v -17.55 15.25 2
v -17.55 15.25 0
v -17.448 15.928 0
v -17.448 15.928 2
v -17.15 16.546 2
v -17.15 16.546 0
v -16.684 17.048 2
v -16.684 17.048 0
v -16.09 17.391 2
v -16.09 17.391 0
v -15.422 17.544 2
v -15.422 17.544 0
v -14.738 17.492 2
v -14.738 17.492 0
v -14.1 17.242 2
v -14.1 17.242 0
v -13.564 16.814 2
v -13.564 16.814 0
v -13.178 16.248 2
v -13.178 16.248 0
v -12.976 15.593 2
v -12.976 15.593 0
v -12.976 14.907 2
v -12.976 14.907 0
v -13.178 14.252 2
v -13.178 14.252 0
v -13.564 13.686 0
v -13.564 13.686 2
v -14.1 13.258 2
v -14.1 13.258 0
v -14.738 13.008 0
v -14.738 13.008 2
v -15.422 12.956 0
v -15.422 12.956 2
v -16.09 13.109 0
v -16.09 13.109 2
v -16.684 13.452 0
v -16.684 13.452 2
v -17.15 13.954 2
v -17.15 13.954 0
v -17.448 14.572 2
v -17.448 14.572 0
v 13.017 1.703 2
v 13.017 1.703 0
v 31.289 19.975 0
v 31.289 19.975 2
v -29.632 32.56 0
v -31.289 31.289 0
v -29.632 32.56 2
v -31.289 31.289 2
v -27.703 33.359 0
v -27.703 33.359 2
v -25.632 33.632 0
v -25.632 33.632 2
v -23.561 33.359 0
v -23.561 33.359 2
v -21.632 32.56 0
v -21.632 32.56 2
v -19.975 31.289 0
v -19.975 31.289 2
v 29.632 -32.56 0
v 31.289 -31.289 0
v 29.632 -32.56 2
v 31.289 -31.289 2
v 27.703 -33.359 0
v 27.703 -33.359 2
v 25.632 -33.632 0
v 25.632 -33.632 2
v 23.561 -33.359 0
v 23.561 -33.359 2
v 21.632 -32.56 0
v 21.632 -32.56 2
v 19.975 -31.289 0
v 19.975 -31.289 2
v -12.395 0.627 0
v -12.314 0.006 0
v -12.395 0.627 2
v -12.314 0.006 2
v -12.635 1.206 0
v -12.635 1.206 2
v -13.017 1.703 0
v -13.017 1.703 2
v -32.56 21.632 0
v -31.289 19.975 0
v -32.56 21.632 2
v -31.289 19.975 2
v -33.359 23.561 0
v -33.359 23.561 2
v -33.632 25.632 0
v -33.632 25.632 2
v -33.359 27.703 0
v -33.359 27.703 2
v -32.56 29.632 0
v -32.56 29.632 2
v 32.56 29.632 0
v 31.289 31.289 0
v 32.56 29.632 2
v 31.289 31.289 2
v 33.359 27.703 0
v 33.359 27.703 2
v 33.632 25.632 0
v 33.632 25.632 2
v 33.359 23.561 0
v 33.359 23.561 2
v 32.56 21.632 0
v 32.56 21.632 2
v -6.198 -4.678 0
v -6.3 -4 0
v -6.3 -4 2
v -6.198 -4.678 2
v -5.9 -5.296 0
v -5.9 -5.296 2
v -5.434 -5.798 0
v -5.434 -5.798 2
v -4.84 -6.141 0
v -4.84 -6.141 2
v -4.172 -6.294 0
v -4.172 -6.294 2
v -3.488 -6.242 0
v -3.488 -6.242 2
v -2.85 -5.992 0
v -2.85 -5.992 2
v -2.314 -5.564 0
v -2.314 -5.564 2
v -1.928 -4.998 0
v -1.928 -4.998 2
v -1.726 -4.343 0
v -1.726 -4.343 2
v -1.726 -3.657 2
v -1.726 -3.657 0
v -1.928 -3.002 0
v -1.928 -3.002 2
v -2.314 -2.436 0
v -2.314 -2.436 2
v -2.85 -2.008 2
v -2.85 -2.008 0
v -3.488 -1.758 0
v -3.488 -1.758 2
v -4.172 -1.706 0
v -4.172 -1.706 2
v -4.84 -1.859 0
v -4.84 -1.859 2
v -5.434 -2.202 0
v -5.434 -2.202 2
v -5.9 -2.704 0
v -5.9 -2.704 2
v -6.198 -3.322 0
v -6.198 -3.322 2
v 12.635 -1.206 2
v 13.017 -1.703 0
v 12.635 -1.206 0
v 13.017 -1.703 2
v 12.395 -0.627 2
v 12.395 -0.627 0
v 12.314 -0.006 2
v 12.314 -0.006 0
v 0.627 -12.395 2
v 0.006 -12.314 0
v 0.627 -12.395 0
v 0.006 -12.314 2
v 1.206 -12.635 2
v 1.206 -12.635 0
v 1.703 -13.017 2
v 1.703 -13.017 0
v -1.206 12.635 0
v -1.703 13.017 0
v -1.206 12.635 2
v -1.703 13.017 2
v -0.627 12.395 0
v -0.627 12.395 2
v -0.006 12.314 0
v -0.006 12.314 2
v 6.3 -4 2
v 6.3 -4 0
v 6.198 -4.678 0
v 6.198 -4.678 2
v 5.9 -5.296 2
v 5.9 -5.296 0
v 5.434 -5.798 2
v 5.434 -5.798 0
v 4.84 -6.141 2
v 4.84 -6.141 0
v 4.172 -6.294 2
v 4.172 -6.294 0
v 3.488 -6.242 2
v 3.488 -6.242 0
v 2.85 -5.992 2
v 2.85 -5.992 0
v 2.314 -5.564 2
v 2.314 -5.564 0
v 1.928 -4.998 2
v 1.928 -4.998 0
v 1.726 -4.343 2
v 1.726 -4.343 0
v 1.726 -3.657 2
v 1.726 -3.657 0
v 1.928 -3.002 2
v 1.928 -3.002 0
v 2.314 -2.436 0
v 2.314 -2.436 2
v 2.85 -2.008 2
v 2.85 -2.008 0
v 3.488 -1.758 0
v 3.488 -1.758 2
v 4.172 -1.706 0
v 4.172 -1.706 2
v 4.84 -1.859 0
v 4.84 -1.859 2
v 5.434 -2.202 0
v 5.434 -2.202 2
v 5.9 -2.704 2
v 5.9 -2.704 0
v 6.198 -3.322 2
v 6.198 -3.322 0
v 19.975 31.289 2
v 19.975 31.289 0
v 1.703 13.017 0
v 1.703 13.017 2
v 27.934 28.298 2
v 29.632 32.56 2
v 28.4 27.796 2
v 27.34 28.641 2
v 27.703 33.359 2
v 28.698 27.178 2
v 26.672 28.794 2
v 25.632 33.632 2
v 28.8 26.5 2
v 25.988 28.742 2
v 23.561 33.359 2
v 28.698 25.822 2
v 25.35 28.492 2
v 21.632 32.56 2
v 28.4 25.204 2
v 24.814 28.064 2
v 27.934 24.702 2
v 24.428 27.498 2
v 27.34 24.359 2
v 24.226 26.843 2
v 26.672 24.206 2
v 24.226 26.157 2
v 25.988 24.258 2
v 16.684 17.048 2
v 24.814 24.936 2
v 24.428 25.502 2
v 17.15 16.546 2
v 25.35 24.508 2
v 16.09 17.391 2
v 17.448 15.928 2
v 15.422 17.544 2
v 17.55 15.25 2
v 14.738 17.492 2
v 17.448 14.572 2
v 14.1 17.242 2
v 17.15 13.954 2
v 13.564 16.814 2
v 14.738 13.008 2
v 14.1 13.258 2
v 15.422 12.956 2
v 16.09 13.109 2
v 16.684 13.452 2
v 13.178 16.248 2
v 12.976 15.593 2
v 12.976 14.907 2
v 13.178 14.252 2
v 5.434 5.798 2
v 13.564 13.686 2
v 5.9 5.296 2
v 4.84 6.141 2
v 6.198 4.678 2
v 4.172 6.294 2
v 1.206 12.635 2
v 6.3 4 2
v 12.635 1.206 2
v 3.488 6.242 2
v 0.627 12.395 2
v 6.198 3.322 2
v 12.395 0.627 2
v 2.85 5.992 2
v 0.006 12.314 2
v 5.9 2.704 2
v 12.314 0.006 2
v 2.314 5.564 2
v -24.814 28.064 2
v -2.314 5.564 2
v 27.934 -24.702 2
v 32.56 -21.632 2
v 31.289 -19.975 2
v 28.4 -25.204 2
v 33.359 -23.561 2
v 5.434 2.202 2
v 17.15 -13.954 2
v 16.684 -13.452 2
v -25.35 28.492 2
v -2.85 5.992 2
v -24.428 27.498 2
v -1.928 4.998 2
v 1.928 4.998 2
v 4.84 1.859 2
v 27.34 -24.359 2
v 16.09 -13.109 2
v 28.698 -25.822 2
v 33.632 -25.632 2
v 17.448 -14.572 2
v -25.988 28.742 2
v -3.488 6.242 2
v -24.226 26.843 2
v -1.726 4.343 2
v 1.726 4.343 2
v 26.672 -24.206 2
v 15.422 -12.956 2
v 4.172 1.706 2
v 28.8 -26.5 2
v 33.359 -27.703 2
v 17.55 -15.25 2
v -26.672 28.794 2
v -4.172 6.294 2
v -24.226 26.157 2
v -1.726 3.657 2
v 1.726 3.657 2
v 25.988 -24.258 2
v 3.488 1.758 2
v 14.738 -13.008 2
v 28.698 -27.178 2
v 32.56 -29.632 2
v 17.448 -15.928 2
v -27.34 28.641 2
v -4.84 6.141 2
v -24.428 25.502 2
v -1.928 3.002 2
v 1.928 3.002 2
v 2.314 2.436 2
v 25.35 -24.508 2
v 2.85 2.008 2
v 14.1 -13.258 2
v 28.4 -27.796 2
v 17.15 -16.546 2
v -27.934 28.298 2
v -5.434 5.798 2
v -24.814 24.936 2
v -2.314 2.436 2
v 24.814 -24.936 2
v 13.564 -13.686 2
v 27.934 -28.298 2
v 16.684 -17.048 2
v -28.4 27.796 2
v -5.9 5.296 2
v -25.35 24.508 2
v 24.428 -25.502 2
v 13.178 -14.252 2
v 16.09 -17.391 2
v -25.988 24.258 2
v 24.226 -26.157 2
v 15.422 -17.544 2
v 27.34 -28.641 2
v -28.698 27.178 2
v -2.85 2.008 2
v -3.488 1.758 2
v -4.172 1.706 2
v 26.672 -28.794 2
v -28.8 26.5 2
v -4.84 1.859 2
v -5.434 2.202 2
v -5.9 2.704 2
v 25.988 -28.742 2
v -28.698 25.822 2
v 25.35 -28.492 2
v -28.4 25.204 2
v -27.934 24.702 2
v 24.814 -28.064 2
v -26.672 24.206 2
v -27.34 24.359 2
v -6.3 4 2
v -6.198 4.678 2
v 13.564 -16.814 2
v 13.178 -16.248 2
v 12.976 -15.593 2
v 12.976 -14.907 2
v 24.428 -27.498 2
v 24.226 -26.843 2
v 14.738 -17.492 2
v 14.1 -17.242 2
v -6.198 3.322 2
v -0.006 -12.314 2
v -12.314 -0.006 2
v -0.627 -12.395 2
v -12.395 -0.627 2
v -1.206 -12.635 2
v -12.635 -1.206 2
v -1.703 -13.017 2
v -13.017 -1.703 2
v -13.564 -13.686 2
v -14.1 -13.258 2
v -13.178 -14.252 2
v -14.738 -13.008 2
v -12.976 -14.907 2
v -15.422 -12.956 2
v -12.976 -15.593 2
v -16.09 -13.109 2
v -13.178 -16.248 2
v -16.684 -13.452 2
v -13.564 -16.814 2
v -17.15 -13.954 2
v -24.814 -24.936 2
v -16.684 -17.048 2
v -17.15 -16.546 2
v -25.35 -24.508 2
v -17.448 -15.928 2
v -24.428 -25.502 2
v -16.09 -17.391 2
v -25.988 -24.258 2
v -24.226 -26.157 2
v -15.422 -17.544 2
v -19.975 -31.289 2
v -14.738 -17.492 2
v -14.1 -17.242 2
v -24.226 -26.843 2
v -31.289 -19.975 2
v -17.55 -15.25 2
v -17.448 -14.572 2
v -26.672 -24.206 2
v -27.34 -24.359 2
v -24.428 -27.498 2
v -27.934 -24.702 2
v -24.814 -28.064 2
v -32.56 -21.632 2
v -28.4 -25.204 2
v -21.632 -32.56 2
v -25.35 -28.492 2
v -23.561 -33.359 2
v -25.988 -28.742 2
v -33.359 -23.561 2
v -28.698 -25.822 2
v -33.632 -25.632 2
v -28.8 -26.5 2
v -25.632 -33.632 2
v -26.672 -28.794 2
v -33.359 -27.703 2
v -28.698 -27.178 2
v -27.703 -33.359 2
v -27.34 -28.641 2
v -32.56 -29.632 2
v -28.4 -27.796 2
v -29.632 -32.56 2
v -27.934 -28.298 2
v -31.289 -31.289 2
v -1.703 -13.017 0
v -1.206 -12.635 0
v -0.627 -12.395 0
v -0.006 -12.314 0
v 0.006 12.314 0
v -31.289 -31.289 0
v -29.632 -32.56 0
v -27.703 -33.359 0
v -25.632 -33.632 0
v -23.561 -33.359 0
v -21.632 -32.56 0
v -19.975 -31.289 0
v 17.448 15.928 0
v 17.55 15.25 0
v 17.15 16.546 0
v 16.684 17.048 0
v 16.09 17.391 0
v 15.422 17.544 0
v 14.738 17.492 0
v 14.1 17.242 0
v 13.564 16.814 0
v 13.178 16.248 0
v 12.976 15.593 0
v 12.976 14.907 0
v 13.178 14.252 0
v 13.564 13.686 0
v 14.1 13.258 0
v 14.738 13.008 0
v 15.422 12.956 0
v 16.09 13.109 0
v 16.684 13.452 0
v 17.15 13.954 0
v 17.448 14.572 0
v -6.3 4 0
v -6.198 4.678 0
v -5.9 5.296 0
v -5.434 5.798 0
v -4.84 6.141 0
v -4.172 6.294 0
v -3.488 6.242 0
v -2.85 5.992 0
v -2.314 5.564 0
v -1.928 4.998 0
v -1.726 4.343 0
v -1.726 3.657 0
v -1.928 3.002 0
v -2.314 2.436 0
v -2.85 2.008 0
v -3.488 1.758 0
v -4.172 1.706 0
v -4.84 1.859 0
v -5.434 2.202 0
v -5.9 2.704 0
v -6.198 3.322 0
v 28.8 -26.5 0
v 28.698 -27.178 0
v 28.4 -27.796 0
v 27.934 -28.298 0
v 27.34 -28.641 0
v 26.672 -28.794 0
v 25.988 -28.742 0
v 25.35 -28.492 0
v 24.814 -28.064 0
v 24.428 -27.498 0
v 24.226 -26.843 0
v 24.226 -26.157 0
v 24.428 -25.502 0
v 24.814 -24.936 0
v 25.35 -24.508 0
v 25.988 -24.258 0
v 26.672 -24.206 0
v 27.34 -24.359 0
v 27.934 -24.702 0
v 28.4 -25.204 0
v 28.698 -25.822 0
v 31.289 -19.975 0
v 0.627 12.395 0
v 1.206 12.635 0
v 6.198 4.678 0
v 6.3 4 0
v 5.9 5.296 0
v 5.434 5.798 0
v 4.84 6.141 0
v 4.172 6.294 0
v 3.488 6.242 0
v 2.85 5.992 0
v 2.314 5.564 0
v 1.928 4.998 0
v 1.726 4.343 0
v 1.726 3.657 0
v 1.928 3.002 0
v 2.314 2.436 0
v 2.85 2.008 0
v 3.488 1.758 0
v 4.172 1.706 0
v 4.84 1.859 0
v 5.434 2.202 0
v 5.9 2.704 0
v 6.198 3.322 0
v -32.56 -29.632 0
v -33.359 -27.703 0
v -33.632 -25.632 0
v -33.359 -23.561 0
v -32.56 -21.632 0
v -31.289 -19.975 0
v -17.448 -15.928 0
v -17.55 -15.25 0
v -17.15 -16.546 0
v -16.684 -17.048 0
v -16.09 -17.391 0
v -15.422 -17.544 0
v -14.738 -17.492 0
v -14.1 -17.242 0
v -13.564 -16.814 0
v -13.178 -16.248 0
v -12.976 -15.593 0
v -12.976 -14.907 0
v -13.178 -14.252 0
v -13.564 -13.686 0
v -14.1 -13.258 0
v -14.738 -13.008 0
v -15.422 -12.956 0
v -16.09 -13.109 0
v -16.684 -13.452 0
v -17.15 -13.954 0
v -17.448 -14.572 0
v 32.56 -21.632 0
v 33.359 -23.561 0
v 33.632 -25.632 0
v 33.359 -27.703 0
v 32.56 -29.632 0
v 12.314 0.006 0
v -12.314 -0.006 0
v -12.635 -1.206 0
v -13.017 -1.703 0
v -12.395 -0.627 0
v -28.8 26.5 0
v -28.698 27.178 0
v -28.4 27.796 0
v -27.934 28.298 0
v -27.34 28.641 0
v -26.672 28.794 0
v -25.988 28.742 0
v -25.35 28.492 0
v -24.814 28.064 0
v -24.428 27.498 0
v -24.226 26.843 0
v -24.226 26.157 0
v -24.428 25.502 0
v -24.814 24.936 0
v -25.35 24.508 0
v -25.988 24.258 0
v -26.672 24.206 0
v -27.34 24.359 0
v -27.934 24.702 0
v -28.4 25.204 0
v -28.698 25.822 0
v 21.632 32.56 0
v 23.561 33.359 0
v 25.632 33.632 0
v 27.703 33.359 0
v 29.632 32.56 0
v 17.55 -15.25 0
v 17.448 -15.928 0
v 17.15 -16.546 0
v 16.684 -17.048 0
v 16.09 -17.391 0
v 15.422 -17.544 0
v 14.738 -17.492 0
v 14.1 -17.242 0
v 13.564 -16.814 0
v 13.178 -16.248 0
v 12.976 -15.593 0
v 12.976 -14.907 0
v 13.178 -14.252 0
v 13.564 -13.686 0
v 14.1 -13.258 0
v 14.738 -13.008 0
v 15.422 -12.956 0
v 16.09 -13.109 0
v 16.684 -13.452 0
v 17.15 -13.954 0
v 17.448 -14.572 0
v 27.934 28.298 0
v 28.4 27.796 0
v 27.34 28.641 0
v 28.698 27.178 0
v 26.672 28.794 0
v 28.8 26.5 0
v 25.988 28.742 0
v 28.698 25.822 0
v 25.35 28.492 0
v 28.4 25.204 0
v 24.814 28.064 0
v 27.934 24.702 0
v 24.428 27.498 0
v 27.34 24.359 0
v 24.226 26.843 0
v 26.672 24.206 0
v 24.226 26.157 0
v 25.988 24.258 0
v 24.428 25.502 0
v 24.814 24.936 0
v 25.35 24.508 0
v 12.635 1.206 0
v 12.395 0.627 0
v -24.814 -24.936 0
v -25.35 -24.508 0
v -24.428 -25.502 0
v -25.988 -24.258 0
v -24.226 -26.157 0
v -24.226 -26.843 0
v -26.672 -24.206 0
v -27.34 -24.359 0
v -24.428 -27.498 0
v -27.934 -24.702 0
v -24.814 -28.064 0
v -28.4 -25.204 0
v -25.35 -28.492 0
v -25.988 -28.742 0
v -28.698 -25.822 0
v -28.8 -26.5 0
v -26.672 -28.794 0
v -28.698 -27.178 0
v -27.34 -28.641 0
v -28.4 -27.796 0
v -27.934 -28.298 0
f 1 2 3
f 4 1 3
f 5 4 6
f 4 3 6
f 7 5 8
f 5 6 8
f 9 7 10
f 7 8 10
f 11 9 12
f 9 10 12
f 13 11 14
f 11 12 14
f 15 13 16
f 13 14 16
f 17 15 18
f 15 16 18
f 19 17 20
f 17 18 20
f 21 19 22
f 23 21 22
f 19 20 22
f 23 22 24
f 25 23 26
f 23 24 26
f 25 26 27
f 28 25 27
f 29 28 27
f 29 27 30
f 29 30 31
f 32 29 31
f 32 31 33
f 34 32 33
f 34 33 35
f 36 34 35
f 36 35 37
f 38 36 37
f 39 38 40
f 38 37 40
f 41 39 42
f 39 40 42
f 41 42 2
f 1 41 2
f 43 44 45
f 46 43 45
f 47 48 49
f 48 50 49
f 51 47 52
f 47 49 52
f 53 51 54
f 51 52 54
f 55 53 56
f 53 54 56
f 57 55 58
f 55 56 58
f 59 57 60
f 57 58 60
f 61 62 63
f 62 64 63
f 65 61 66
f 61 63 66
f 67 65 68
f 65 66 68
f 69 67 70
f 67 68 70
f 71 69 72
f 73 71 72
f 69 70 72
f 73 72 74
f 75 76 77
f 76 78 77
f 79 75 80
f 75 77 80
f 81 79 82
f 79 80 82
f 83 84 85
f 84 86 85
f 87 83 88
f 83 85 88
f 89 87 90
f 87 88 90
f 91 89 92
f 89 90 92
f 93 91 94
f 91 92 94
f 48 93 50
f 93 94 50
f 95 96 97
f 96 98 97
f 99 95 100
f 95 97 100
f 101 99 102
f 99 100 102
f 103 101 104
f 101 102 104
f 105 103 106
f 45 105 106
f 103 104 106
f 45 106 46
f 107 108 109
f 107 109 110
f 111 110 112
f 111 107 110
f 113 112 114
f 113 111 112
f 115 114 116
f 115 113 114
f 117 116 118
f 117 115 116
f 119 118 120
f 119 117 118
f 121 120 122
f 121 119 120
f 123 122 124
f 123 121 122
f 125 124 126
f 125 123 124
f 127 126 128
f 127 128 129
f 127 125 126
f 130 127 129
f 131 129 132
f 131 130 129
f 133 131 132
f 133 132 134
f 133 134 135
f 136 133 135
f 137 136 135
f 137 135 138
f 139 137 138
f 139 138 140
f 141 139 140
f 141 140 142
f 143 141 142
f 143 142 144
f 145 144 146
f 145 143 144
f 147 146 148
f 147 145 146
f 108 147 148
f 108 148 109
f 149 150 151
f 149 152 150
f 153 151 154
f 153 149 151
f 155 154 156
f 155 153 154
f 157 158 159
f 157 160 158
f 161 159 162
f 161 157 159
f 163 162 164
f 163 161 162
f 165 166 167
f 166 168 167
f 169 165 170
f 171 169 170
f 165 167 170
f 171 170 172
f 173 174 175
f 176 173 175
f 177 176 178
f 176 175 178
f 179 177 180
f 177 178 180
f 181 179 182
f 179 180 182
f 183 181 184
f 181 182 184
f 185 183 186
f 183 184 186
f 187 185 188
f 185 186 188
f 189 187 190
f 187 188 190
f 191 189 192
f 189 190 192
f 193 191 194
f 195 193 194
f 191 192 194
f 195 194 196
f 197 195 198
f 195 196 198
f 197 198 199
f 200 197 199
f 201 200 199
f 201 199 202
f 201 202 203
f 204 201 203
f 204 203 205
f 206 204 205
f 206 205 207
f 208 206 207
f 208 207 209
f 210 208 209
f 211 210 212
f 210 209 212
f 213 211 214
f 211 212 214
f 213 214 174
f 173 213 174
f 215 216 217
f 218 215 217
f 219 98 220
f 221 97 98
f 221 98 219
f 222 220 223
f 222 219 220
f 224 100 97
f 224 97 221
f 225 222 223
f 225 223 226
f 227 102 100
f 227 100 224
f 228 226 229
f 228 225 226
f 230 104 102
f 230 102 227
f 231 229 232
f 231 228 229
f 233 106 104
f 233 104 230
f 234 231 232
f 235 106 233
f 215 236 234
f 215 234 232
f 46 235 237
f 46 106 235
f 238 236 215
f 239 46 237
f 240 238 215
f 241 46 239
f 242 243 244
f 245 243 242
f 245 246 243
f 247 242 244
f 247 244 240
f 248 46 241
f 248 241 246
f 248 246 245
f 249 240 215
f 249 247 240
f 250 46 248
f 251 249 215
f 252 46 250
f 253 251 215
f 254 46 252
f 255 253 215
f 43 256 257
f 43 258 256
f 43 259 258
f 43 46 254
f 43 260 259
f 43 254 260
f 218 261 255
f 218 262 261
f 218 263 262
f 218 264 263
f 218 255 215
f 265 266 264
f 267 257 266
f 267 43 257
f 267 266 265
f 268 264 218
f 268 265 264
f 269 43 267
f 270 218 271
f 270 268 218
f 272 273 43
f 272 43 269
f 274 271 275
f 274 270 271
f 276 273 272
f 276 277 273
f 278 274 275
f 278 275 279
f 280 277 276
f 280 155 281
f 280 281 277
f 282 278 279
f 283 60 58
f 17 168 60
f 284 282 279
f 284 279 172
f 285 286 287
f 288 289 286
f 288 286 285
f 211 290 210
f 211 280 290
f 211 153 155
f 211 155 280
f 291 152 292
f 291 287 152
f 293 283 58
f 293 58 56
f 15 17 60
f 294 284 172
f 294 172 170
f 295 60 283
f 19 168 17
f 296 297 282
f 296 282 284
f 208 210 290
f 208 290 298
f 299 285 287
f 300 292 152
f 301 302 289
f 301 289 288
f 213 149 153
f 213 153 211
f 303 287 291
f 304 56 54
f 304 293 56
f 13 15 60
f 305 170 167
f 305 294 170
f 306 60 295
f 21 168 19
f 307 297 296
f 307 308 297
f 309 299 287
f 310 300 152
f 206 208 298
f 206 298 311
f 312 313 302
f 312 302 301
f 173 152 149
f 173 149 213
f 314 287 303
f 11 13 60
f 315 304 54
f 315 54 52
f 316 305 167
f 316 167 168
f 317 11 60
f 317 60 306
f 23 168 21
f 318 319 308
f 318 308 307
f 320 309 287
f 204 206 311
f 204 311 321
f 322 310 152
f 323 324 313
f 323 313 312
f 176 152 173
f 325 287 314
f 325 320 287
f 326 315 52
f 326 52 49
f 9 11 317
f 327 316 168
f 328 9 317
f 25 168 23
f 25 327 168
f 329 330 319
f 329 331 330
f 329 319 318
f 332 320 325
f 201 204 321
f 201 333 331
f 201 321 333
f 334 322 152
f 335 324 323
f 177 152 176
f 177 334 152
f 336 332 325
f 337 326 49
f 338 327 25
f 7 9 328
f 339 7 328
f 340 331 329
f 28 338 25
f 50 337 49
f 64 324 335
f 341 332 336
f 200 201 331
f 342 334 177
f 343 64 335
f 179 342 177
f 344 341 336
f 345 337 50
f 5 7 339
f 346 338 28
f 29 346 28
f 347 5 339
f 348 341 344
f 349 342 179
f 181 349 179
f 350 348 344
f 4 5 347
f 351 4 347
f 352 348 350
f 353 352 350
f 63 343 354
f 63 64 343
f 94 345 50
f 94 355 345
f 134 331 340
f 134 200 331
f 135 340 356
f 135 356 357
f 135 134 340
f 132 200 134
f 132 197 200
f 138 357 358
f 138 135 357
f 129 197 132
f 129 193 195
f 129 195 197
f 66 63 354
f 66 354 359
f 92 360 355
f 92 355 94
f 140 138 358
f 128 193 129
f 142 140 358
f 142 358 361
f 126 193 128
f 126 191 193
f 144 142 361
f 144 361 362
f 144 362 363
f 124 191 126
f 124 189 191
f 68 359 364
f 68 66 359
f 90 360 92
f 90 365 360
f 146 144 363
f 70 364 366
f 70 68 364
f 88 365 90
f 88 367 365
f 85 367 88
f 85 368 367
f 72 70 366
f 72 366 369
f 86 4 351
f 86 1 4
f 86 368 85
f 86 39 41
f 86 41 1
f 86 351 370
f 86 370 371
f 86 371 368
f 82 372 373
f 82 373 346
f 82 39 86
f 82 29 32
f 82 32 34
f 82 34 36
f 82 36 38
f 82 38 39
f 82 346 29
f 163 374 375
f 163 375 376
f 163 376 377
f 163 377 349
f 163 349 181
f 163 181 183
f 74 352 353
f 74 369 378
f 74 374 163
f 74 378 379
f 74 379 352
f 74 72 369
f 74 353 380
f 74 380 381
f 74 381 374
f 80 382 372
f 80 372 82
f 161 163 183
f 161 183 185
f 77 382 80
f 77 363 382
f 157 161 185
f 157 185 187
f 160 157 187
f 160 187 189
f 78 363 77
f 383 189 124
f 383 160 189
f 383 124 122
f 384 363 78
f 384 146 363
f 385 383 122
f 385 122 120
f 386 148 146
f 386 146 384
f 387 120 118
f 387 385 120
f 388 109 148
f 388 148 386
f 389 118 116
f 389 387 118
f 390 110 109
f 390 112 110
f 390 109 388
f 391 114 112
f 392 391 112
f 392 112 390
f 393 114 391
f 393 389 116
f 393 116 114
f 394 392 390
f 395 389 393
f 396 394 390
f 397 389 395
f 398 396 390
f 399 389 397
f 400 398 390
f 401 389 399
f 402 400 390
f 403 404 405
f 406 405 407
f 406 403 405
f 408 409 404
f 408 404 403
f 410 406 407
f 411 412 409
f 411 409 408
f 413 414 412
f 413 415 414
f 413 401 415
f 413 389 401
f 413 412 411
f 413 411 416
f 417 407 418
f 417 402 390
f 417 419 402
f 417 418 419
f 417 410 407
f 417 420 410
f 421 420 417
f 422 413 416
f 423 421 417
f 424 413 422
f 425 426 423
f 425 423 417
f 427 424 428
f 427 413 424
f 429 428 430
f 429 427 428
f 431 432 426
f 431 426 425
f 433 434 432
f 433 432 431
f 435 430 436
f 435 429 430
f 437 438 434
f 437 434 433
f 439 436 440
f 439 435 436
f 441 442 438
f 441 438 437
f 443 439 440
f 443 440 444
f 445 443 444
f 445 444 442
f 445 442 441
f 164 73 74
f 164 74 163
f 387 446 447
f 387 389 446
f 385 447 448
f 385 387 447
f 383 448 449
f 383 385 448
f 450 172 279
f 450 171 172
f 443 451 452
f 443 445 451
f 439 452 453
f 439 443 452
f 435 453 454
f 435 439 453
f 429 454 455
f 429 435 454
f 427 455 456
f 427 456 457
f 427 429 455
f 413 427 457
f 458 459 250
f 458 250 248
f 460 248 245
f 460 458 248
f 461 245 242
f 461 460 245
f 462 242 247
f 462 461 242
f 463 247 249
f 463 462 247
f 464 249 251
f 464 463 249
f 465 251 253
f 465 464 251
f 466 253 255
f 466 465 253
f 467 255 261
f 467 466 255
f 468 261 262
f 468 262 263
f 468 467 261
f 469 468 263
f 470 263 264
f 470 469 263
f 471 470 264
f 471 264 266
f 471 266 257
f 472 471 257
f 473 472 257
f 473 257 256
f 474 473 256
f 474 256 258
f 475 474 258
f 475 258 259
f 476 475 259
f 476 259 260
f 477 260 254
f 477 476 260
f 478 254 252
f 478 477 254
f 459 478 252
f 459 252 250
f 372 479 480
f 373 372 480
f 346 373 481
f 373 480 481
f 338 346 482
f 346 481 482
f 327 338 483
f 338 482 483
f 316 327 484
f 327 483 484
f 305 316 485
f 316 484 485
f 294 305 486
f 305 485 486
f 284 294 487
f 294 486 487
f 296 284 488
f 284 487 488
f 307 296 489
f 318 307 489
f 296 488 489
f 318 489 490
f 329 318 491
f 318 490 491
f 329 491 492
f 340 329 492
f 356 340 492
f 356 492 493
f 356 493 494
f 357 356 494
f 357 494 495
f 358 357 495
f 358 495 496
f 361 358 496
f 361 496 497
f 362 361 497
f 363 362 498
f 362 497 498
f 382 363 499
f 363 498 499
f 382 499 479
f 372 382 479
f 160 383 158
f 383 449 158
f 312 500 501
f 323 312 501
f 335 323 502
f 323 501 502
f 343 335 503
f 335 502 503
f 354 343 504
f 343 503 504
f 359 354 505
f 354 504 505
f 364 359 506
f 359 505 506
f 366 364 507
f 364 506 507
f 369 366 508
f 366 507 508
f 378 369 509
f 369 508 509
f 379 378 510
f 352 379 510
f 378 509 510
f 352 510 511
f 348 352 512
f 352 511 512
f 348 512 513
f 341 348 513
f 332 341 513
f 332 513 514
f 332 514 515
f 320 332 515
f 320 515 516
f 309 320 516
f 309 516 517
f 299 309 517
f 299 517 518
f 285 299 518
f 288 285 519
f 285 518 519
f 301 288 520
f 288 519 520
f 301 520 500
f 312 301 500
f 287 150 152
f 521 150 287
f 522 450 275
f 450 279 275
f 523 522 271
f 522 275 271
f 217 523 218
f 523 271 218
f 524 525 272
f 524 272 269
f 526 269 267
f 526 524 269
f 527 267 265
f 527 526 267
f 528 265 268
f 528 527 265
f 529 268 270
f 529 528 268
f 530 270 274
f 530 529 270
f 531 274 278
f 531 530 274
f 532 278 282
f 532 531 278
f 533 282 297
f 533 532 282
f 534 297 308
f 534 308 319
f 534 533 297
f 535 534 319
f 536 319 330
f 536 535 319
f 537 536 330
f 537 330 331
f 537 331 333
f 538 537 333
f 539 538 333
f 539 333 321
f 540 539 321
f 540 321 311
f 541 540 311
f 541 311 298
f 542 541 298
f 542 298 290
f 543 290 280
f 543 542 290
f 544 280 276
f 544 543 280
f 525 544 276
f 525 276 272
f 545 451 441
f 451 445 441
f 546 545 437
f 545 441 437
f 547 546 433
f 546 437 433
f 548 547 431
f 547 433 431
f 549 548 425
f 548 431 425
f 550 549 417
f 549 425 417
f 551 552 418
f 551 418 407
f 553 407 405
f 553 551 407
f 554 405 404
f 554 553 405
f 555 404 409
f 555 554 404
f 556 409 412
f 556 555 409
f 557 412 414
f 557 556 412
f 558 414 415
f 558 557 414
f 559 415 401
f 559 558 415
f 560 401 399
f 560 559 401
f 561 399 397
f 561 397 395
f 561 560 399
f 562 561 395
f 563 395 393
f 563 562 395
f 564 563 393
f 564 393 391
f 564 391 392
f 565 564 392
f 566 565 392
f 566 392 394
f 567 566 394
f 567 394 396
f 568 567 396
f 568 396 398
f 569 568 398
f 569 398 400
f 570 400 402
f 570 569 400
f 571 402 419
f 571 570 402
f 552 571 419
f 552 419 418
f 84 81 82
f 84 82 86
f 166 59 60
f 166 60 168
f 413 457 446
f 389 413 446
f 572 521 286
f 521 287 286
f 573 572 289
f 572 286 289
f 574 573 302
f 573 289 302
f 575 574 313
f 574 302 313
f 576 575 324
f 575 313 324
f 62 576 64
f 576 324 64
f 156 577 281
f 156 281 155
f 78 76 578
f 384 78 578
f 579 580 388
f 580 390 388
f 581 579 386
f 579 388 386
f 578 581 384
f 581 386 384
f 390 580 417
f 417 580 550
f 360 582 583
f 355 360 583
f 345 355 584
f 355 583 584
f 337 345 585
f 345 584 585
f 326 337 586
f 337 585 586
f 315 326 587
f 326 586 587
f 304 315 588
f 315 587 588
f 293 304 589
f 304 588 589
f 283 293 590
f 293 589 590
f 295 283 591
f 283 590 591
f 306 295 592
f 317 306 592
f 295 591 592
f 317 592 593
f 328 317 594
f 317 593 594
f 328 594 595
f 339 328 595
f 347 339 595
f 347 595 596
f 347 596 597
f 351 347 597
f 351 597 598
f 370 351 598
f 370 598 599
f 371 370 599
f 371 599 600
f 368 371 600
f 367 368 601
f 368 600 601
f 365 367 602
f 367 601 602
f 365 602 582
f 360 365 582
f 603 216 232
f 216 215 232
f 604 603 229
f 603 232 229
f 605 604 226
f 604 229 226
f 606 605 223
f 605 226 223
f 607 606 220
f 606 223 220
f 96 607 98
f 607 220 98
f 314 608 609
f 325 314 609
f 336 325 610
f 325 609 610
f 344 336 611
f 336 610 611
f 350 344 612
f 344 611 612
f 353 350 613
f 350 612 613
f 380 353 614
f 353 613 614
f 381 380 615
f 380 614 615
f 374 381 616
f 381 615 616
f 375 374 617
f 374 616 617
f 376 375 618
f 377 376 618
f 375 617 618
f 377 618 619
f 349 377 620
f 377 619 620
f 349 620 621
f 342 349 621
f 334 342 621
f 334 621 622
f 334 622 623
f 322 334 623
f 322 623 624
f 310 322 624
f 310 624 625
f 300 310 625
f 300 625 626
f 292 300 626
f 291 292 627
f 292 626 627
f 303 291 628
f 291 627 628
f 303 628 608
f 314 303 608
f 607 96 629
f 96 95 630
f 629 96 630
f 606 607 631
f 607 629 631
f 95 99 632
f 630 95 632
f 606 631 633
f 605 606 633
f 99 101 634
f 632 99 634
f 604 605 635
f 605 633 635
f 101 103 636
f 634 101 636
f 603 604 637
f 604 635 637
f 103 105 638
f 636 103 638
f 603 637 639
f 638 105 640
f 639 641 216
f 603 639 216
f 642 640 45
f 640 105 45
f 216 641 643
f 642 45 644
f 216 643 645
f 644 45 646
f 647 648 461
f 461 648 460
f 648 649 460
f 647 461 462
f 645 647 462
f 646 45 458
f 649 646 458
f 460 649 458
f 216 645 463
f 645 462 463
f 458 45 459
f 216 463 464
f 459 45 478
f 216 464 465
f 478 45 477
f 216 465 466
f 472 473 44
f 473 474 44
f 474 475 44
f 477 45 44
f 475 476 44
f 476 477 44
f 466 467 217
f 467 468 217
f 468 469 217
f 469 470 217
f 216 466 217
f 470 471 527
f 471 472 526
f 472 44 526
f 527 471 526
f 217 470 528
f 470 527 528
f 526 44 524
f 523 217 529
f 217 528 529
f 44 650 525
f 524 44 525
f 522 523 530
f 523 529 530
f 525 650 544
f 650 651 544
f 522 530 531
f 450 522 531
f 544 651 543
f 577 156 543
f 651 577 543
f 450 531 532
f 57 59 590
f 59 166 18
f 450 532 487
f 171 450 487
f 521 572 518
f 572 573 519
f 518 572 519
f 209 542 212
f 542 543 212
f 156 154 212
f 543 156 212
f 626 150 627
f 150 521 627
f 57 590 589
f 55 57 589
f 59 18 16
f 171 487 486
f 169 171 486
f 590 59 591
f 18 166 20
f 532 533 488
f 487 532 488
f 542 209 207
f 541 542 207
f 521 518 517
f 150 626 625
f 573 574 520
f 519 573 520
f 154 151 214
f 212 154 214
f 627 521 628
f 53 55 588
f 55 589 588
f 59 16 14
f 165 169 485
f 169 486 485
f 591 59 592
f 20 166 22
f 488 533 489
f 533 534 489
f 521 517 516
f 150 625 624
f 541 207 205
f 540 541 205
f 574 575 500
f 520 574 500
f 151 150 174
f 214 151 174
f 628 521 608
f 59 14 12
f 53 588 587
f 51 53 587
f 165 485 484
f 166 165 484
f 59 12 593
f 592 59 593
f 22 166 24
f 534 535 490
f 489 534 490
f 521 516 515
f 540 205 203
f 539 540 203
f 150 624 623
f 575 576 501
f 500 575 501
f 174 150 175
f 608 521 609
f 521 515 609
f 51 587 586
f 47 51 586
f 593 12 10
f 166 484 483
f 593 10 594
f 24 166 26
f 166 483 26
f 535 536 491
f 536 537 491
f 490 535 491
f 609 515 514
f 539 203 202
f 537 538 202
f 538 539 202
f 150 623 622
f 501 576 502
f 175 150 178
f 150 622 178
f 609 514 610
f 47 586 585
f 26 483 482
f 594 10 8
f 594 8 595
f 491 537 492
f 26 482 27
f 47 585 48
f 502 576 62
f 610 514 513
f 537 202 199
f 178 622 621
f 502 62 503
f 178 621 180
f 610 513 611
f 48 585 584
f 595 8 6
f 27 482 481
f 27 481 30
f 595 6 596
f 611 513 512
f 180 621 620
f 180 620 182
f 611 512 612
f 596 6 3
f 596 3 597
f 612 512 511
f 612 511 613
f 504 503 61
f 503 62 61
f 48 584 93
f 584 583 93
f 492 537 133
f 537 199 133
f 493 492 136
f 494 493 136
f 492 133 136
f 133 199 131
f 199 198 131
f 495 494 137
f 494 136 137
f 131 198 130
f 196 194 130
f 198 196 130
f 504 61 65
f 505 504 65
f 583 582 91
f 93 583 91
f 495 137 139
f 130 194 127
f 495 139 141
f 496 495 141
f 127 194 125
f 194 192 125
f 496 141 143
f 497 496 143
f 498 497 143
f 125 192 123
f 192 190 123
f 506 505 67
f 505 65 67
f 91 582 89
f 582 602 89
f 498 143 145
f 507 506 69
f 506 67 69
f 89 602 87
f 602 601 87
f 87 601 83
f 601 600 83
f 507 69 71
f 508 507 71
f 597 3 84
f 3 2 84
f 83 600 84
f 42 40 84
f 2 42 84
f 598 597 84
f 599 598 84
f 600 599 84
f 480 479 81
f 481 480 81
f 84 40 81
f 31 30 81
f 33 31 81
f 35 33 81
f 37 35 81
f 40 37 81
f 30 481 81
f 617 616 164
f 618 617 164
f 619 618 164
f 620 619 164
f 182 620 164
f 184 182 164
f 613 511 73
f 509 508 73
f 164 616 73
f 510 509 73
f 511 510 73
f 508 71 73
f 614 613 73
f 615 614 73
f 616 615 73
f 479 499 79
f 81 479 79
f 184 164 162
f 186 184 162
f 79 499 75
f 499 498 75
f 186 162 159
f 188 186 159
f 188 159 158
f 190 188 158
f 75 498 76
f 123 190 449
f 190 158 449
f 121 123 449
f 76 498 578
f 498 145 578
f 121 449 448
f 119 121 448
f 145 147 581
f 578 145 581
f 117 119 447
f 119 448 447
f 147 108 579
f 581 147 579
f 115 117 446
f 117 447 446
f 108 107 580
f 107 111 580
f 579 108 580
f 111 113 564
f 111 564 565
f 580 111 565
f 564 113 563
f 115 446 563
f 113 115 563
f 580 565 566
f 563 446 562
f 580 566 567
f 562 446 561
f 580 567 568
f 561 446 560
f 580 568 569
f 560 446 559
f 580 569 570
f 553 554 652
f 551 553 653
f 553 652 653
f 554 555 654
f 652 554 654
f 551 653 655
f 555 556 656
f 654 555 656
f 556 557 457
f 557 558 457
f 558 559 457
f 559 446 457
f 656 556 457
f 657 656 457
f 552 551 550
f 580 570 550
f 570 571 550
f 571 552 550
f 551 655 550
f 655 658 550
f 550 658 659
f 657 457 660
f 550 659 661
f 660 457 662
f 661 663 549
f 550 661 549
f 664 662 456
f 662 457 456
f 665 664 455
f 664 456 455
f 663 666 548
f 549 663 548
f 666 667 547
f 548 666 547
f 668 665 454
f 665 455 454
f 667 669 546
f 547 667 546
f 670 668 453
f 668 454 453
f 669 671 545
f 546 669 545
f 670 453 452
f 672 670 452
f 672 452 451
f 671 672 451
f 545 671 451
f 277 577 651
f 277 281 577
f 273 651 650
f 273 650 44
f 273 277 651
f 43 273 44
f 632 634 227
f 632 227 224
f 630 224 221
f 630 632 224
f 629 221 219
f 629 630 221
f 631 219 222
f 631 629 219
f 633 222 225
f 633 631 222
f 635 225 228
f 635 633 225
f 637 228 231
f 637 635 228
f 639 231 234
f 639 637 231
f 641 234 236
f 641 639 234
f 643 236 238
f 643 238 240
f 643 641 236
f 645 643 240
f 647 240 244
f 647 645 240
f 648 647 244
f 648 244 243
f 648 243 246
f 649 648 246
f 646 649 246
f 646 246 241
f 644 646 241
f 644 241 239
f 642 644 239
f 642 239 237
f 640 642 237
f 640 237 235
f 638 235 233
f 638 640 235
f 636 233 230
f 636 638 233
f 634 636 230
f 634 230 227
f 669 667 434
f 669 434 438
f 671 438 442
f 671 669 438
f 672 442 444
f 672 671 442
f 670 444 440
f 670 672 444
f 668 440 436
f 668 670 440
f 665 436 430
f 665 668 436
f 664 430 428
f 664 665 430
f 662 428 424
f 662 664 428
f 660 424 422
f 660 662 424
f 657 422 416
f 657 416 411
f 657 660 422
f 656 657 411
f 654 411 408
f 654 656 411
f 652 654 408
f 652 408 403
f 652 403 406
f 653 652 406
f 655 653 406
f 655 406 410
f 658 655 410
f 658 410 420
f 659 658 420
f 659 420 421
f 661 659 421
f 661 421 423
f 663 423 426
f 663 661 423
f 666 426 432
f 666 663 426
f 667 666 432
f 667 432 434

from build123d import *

# Parameters (mm, degrees)
F0_R     = 2.3
F1_DEPTH = 2
F4_R     = 7.99999
F5_R     = 2.4


# Not quite as in the source:
# - a fillet or chamfer is up to 0.001 mm smaller than in the source, because OpenCascade refuses the exact size


with BuildPart() as f1:
    # F0 (on Top) → F1 (new body)
    with BuildSketch(Plane.XY):
        Polygon((12.313708499, 1), (36.9456929209, 25.6319844219), (31.2888386714, 31.2888386714), (25.6319844219, 36.9456929209), (1, 12.313708499), (0, 11.313708499), (0, 0), (11.313708499, 0), align=None)
        with Locations((3.9999969952, 3.9999969952)):
            Circle(F0_R, mode=Mode.SUBTRACT)
        with Locations((15.2499951732, 15.2499951732)):
            Circle(F0_R, mode=Mode.SUBTRACT)
        with Locations((26.4999933512, 26.4999933512)):
            Circle(F0_R, mode=Mode.SUBTRACT)
        Polygon((0, 11.313708499), (1, 12.313708499), (0, 12.313708499), align=None)
        Polygon((12.313708499, 0), (12.313708499, 1), (11.313708499, 0), align=None)
    extrude(amount=F1_DEPTH)

    # F2: F1 across plane


with BuildPart() as f1_1:
    add(f1.part)
    add(f1.part.mirror(Plane.YZ))

    # F3: F1 across plane


with BuildPart() as f1_2:
    add(f1_1.part)
    add(f1_1.part.mirror(Plane.XZ))

    # F4 (radius 8 in the source; OpenCascade refuses exactly that, so slightly less here)
    f4_edges = [f1_2.edges().sort_by_distance(p)[0] for p in [
        (-25.631984, 36.945693, 1),
        (-36.945693, 25.631984, 1),
        (-36.945693, -25.631984, 1),
        (-25.631984, -36.945693, 1),
        (25.631984, -36.945693, 1),
        (36.945693, -25.631984, 1),
        (36.945693, 25.631984, 1),
        (25.631984, 36.945693, 1),
    ]]
    fillet(f4_edges, radius=F4_R)

    # F5
    f5_edges = [f1_2.edges().sort_by_distance(p)[0] for p in [
        (12.313708, 1, 1),
        (12.313708, -1, 1),
        (1, 12.313708, 1),
        (-1, 12.313708, 1),
        (-12.313708, 1, 1),
        (-12.313708, -1, 1),
        (-1, -12.313708, 1),
        (1, -12.313708, 1),
    ]]
    fillet(f5_edges, radius=F5_R)


solid = f1_2.part
